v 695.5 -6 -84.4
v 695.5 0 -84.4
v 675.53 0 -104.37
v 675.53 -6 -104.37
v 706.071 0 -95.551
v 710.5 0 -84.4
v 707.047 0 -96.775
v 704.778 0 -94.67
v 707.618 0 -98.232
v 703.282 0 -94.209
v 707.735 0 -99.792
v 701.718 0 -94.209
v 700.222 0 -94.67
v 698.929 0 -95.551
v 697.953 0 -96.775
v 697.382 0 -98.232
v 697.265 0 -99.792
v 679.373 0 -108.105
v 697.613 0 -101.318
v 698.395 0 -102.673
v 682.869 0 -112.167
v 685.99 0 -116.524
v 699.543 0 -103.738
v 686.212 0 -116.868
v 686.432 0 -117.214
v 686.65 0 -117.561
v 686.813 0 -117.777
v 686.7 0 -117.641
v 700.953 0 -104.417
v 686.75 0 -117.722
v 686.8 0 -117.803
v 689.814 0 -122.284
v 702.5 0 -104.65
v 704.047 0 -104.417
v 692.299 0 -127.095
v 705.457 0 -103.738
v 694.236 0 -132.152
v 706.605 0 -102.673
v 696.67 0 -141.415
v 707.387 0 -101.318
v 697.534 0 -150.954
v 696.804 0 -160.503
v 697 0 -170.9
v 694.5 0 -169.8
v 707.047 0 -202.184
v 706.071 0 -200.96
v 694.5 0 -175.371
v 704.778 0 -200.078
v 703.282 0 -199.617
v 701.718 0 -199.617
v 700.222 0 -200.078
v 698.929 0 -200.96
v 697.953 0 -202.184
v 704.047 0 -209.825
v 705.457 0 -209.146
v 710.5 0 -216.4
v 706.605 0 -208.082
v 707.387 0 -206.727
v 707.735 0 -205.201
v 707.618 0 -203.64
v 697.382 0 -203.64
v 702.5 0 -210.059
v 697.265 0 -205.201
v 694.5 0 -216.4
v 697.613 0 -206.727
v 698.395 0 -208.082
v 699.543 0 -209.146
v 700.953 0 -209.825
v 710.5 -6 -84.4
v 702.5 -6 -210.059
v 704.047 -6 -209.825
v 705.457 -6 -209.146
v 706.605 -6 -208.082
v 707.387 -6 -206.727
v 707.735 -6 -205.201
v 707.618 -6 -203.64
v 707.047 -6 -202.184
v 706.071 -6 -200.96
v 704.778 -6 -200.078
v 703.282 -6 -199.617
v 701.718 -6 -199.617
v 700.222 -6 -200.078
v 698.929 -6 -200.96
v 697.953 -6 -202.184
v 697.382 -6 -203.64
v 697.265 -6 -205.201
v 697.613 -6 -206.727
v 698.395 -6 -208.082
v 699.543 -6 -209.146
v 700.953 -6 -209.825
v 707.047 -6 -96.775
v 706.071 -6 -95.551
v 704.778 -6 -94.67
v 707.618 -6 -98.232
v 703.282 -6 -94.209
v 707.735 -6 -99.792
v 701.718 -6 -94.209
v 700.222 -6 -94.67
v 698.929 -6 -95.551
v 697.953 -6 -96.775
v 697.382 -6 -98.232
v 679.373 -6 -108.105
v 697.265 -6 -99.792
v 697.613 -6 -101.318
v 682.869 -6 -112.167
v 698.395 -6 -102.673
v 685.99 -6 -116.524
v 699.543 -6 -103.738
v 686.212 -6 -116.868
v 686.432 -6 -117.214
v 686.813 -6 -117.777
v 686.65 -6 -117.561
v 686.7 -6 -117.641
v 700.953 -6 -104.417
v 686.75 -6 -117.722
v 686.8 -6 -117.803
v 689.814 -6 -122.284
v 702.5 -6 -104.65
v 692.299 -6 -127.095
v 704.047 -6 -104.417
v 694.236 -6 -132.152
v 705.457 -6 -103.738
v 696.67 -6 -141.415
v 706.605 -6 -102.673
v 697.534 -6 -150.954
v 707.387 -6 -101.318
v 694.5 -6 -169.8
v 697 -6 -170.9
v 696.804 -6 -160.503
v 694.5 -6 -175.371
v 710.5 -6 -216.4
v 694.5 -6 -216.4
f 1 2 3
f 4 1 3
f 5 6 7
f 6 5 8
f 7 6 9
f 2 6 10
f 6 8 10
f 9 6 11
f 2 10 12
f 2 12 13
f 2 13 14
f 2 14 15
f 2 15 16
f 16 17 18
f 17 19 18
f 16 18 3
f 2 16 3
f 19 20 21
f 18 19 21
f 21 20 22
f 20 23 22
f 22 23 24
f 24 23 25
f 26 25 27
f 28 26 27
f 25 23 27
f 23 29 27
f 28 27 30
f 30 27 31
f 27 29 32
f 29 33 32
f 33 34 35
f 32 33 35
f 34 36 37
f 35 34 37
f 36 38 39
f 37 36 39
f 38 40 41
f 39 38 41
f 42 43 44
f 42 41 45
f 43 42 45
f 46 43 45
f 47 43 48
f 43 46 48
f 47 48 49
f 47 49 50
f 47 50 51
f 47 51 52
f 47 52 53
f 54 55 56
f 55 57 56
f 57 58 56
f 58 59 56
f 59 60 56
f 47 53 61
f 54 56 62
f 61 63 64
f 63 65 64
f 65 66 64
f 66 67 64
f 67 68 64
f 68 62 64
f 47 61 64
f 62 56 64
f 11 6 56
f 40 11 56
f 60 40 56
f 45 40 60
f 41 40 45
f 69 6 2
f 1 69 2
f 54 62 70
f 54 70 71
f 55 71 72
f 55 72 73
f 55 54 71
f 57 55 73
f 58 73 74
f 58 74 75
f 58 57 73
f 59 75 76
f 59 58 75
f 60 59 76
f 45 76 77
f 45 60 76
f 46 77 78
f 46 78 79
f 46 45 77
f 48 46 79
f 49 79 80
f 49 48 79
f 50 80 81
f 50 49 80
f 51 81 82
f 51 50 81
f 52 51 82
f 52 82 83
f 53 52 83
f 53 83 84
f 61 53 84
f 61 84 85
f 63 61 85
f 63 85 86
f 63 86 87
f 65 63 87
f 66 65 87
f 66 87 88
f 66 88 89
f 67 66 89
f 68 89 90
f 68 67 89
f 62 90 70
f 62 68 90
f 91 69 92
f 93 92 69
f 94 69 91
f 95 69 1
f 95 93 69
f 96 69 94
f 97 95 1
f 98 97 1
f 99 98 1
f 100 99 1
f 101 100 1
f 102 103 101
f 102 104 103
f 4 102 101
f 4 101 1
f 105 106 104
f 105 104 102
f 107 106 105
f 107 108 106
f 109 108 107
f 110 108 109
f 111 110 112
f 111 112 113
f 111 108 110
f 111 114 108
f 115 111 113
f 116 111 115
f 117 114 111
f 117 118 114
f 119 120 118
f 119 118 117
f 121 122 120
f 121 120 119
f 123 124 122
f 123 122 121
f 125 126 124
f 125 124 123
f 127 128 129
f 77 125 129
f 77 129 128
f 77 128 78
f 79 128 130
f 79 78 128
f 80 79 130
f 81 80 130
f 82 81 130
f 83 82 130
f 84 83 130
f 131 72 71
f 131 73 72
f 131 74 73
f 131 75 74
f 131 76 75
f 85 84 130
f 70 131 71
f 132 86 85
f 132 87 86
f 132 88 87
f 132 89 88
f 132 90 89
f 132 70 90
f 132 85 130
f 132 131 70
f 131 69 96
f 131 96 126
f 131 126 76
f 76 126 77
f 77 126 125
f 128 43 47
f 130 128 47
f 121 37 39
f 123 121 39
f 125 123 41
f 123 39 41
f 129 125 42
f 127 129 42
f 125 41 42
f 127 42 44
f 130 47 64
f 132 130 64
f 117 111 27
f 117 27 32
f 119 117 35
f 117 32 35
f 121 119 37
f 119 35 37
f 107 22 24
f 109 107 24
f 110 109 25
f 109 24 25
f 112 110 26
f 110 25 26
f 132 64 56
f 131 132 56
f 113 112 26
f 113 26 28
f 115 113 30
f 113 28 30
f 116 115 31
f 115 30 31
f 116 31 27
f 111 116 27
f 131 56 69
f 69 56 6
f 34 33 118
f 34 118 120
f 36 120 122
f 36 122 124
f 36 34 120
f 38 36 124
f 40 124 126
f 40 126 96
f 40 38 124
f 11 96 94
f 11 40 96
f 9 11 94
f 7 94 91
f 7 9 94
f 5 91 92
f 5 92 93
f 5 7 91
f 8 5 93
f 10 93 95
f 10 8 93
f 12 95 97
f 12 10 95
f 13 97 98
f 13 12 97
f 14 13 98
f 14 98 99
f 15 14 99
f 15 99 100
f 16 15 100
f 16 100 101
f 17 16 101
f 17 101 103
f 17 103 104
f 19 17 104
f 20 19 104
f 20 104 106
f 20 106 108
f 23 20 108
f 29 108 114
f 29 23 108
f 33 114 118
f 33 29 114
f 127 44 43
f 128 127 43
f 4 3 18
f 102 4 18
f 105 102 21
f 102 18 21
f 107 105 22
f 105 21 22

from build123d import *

# Parameters (mm, degrees)
MODEL_R             = 5.25
BOSS_EXTRUDE1_DEPTH = 6
BOSS_EXTRUDE2_DEPTH = 6
SKETCH3_R           = 60.25
CUT_EXTRUDE1_DEPTH  = 10


with BuildPart() as part:
    # Model → Boss-Extrude1 (new body)
    with BuildSketch(Plane.XZ):
        with BuildLine():
            Line((694.500002921, -169.799850935), (696.999999799, -170.90000032))
            Line((696.999999799, -170.90000032), (694.500002921, -175.370624794))
            Line((694.500002921, -175.370624794), (694.500002921, -216.399998612))
            Line((694.500002921, -216.399998612), (710.5, -216.399998612))
            Line((710.5, -216.399998612), (710.5, -84.4))
            Line((710.5, -84.4), (695.5, -84.4))
            Line((695.5, -84.4), (695.5, -89.4))
            ThreePointArc((695.5, -89.4), (692.807600963, -103.748366696), (685.918459021, -116.61943358))
            ThreePointArc((685.918459021, -116.61943358), (690.782850281, -124.007719547), (694.236343401, -132.151579634))
            ThreePointArc((694.236343401, -132.151579634), (697.533641796, -150.953546779), (694.500002921, -169.799850935))
        make_face()
        with Locations(Location((702.5, -204.808507537, 0), (0, 0, 270))):
            Circle(MODEL_R, mode=Mode.SUBTRACT)
        with Locations(Location((702.5, -99.4, 0), (0, 0, 270))):
            Circle(MODEL_R, mode=Mode.SUBTRACT)
    extrude(amount=BOSS_EXTRUDE1_DEPTH)

    # Sketch2 → Boss-Extrude2 (add)
    with BuildSketch(Plane(origin=(0, 0, 0), x_dir=(1, 0, 0), z_dir=(0, 1, 0))):
        with BuildLine():
            Line((695.5, 84.4), (675.529768986, 104.370231014))
            ThreePointArc((675.529768986, 104.370231014), (681.656132965, 110.674376833), (686.799952909, 117.802890457))
            Line((686.799952909, 117.802890457), (697.045493523, 96.913214697))
            Line((697.045493523, 96.913214697), (695.5, 84.4))
        make_face()
    extrude(amount=-BOSS_EXTRUDE2_DEPTH)

    # Sketch3 → Cut-Extrude1 (cut)
    with BuildSketch(Plane(origin=(0, 0, 0), x_dir=(1, 0, 0), z_dir=(0, 1, 0))):
        with Locations((635.5, 149.4)):
            Circle(SKETCH3_R)
    extrude(amount=-CUT_EXTRUDE1_DEPTH, mode=Mode.SUBTRACT)


solid = part.part
